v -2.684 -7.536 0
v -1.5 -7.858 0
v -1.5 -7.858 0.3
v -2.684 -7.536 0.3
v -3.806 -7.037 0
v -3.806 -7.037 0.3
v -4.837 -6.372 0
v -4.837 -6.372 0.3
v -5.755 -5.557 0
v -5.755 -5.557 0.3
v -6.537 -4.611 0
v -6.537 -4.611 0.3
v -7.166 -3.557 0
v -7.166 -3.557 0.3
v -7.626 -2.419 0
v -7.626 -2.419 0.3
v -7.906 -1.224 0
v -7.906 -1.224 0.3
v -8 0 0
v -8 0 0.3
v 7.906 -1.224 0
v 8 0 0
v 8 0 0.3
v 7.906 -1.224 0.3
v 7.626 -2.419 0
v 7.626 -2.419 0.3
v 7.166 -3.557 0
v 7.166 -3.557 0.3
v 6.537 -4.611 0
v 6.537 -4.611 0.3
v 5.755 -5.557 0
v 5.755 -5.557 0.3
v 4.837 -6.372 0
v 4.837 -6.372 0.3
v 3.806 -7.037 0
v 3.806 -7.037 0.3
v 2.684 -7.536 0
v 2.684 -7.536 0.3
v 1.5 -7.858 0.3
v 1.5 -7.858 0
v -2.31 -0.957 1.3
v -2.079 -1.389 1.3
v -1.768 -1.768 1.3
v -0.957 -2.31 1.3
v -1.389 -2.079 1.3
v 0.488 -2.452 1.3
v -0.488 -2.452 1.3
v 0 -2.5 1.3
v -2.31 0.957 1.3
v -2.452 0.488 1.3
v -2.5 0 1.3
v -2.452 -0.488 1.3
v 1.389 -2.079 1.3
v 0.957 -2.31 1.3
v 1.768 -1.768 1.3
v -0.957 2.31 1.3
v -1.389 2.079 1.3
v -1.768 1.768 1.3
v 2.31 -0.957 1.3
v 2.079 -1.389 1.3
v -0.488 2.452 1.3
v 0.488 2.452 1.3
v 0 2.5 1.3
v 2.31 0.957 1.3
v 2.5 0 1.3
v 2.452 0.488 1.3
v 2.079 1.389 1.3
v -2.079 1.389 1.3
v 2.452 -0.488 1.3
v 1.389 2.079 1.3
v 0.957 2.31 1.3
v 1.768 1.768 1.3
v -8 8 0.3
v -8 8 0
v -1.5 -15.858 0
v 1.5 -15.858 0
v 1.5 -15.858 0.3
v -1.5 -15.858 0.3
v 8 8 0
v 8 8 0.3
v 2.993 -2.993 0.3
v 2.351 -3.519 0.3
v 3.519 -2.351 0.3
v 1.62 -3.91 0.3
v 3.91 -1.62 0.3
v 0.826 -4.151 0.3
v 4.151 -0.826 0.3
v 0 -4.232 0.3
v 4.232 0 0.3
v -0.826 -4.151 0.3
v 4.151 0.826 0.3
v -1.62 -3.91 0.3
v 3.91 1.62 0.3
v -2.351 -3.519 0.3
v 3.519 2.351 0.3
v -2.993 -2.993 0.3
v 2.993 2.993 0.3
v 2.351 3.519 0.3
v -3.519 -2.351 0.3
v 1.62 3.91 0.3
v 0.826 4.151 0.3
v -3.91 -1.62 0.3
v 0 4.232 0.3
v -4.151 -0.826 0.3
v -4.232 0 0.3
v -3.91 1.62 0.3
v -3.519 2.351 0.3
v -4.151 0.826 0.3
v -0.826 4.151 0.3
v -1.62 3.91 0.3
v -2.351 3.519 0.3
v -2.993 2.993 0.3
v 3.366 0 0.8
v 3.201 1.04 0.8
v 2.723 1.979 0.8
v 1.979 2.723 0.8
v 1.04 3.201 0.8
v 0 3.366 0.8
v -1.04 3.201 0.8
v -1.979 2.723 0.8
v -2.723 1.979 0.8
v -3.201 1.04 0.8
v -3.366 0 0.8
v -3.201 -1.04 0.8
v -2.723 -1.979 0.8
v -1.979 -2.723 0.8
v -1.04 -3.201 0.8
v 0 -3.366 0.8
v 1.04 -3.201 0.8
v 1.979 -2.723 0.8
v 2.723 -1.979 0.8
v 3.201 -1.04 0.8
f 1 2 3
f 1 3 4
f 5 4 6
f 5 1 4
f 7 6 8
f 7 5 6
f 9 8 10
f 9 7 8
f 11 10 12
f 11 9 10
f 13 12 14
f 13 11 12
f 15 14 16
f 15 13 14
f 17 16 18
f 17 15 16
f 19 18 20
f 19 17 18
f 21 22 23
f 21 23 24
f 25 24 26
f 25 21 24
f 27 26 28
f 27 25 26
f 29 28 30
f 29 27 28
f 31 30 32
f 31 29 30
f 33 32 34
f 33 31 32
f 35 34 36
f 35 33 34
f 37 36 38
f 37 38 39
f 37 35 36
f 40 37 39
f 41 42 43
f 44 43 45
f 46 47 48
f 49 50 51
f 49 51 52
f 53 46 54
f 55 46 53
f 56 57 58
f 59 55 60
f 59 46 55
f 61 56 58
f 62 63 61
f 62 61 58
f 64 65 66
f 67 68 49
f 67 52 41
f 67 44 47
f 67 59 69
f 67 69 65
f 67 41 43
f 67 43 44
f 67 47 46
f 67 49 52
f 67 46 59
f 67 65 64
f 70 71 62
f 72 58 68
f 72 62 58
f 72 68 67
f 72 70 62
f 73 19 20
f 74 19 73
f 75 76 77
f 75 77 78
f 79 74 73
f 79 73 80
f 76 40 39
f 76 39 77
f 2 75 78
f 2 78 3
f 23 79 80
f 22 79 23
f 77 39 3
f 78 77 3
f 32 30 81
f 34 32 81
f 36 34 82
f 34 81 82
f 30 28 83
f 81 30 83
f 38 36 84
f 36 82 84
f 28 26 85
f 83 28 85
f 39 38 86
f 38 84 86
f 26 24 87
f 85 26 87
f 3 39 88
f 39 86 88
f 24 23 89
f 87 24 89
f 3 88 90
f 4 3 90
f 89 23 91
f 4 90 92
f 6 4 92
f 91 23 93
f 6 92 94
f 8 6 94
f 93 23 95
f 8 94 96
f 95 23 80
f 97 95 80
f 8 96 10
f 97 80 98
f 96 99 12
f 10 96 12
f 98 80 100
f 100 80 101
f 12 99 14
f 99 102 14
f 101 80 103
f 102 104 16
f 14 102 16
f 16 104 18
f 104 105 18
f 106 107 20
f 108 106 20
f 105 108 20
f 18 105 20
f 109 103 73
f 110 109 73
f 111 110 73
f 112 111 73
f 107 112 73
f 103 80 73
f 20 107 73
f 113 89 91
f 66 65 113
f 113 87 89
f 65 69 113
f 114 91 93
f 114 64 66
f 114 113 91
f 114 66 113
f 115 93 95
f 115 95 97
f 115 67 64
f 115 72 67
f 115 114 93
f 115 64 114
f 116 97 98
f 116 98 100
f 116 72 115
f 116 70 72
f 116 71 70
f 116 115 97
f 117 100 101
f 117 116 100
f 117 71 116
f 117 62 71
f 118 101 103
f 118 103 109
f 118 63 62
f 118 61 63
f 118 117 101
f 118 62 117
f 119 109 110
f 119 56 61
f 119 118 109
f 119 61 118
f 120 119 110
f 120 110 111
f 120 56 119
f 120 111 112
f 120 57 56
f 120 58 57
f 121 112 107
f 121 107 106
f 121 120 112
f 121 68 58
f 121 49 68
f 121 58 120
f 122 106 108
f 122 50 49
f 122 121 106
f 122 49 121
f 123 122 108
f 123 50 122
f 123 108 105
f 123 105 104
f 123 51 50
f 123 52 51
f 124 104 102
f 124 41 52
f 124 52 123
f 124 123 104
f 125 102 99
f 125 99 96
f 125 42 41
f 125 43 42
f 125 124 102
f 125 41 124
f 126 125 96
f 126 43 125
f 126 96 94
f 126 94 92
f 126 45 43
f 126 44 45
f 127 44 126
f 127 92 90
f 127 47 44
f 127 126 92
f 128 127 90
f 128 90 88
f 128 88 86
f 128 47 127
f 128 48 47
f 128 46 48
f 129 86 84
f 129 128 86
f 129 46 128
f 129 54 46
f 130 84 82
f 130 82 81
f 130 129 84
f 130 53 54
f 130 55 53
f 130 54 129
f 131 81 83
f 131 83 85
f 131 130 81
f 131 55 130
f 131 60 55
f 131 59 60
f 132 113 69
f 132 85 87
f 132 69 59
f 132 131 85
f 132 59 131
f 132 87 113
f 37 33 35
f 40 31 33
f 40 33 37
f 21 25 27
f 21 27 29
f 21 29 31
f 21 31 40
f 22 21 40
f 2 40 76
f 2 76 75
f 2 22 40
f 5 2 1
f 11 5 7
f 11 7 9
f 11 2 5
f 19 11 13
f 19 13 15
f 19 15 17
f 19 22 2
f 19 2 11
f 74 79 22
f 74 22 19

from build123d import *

# Parameters (mm, degrees)
EXTRUDE_1_DEPTH  = 0.3
SKETCH_2_R       = 2.5
EXTRUDE_2_DEPTH  = 1
CHAMFER_1_SIZE   = 1.732050808
CHAMFER_1_SIZE_2 = 1


with BuildPart() as part:
    # 草图1 → 凸台-拉伸1 (new body)
    with BuildSketch(Plane.XY):
        with BuildLine():
            Line((-8, 0), (-8, 8))
            Line((-8, 8), (8, 8))
            Line((8, 8), (8, 0))
            ThreePointArc((8, 0), (6.164414003, -5.099019514), (1.5, -7.858116823))
            Line((1.5, -7.858116823), (1.5, -15.858116823))
            Line((1.5, -15.858116823), (-1.5, -15.858116823))
            Line((-1.5, -15.858116823), (-1.5, -7.858116823))
            ThreePointArc((-1.5, -7.858116823), (-6.164414003, -5.099019514), (-8, 0))
        make_face()
    extrude(amount=EXTRUDE_1_DEPTH)

    # 草图2 → 凸台-拉伸2 (add)
    with BuildSketch(Plane.XY.offset(0.3)):
        Circle(SKETCH_2_R)
    extrude(amount=EXTRUDE_2_DEPTH)

    # 倒角1
    # the kernel refuses this chamfer: 1.732050808, 1 mm, written as the material it adds along each edge
    with BuildSketch(Plane(origin=(0, 0, 0.3), x_dir=(1, 0, 0), z_dir=(0, -1, 0))) as chamfer_1_piece_1_section:
        Polygon((2.5 + CHAMFER_1_SIZE, 0), (2.5, CHAMFER_1_SIZE_2), (2.5, 0), align=None)
    chamfer_1_piece_1 = revolve(axis=Axis((0, 0, 0.3), (0, 0, 1)), mode=Mode.PRIVATE)
    chamfer_1_piece_1 = split(chamfer_1_piece_1, bisect_by=Plane(origin=(-3.382683679, 0, 1.3), z_dir=(0, 0, -1)), keep=Keep.TOP, mode=Mode.PRIVATE)
    add(chamfer_1_piece_1)


solid = part.part
